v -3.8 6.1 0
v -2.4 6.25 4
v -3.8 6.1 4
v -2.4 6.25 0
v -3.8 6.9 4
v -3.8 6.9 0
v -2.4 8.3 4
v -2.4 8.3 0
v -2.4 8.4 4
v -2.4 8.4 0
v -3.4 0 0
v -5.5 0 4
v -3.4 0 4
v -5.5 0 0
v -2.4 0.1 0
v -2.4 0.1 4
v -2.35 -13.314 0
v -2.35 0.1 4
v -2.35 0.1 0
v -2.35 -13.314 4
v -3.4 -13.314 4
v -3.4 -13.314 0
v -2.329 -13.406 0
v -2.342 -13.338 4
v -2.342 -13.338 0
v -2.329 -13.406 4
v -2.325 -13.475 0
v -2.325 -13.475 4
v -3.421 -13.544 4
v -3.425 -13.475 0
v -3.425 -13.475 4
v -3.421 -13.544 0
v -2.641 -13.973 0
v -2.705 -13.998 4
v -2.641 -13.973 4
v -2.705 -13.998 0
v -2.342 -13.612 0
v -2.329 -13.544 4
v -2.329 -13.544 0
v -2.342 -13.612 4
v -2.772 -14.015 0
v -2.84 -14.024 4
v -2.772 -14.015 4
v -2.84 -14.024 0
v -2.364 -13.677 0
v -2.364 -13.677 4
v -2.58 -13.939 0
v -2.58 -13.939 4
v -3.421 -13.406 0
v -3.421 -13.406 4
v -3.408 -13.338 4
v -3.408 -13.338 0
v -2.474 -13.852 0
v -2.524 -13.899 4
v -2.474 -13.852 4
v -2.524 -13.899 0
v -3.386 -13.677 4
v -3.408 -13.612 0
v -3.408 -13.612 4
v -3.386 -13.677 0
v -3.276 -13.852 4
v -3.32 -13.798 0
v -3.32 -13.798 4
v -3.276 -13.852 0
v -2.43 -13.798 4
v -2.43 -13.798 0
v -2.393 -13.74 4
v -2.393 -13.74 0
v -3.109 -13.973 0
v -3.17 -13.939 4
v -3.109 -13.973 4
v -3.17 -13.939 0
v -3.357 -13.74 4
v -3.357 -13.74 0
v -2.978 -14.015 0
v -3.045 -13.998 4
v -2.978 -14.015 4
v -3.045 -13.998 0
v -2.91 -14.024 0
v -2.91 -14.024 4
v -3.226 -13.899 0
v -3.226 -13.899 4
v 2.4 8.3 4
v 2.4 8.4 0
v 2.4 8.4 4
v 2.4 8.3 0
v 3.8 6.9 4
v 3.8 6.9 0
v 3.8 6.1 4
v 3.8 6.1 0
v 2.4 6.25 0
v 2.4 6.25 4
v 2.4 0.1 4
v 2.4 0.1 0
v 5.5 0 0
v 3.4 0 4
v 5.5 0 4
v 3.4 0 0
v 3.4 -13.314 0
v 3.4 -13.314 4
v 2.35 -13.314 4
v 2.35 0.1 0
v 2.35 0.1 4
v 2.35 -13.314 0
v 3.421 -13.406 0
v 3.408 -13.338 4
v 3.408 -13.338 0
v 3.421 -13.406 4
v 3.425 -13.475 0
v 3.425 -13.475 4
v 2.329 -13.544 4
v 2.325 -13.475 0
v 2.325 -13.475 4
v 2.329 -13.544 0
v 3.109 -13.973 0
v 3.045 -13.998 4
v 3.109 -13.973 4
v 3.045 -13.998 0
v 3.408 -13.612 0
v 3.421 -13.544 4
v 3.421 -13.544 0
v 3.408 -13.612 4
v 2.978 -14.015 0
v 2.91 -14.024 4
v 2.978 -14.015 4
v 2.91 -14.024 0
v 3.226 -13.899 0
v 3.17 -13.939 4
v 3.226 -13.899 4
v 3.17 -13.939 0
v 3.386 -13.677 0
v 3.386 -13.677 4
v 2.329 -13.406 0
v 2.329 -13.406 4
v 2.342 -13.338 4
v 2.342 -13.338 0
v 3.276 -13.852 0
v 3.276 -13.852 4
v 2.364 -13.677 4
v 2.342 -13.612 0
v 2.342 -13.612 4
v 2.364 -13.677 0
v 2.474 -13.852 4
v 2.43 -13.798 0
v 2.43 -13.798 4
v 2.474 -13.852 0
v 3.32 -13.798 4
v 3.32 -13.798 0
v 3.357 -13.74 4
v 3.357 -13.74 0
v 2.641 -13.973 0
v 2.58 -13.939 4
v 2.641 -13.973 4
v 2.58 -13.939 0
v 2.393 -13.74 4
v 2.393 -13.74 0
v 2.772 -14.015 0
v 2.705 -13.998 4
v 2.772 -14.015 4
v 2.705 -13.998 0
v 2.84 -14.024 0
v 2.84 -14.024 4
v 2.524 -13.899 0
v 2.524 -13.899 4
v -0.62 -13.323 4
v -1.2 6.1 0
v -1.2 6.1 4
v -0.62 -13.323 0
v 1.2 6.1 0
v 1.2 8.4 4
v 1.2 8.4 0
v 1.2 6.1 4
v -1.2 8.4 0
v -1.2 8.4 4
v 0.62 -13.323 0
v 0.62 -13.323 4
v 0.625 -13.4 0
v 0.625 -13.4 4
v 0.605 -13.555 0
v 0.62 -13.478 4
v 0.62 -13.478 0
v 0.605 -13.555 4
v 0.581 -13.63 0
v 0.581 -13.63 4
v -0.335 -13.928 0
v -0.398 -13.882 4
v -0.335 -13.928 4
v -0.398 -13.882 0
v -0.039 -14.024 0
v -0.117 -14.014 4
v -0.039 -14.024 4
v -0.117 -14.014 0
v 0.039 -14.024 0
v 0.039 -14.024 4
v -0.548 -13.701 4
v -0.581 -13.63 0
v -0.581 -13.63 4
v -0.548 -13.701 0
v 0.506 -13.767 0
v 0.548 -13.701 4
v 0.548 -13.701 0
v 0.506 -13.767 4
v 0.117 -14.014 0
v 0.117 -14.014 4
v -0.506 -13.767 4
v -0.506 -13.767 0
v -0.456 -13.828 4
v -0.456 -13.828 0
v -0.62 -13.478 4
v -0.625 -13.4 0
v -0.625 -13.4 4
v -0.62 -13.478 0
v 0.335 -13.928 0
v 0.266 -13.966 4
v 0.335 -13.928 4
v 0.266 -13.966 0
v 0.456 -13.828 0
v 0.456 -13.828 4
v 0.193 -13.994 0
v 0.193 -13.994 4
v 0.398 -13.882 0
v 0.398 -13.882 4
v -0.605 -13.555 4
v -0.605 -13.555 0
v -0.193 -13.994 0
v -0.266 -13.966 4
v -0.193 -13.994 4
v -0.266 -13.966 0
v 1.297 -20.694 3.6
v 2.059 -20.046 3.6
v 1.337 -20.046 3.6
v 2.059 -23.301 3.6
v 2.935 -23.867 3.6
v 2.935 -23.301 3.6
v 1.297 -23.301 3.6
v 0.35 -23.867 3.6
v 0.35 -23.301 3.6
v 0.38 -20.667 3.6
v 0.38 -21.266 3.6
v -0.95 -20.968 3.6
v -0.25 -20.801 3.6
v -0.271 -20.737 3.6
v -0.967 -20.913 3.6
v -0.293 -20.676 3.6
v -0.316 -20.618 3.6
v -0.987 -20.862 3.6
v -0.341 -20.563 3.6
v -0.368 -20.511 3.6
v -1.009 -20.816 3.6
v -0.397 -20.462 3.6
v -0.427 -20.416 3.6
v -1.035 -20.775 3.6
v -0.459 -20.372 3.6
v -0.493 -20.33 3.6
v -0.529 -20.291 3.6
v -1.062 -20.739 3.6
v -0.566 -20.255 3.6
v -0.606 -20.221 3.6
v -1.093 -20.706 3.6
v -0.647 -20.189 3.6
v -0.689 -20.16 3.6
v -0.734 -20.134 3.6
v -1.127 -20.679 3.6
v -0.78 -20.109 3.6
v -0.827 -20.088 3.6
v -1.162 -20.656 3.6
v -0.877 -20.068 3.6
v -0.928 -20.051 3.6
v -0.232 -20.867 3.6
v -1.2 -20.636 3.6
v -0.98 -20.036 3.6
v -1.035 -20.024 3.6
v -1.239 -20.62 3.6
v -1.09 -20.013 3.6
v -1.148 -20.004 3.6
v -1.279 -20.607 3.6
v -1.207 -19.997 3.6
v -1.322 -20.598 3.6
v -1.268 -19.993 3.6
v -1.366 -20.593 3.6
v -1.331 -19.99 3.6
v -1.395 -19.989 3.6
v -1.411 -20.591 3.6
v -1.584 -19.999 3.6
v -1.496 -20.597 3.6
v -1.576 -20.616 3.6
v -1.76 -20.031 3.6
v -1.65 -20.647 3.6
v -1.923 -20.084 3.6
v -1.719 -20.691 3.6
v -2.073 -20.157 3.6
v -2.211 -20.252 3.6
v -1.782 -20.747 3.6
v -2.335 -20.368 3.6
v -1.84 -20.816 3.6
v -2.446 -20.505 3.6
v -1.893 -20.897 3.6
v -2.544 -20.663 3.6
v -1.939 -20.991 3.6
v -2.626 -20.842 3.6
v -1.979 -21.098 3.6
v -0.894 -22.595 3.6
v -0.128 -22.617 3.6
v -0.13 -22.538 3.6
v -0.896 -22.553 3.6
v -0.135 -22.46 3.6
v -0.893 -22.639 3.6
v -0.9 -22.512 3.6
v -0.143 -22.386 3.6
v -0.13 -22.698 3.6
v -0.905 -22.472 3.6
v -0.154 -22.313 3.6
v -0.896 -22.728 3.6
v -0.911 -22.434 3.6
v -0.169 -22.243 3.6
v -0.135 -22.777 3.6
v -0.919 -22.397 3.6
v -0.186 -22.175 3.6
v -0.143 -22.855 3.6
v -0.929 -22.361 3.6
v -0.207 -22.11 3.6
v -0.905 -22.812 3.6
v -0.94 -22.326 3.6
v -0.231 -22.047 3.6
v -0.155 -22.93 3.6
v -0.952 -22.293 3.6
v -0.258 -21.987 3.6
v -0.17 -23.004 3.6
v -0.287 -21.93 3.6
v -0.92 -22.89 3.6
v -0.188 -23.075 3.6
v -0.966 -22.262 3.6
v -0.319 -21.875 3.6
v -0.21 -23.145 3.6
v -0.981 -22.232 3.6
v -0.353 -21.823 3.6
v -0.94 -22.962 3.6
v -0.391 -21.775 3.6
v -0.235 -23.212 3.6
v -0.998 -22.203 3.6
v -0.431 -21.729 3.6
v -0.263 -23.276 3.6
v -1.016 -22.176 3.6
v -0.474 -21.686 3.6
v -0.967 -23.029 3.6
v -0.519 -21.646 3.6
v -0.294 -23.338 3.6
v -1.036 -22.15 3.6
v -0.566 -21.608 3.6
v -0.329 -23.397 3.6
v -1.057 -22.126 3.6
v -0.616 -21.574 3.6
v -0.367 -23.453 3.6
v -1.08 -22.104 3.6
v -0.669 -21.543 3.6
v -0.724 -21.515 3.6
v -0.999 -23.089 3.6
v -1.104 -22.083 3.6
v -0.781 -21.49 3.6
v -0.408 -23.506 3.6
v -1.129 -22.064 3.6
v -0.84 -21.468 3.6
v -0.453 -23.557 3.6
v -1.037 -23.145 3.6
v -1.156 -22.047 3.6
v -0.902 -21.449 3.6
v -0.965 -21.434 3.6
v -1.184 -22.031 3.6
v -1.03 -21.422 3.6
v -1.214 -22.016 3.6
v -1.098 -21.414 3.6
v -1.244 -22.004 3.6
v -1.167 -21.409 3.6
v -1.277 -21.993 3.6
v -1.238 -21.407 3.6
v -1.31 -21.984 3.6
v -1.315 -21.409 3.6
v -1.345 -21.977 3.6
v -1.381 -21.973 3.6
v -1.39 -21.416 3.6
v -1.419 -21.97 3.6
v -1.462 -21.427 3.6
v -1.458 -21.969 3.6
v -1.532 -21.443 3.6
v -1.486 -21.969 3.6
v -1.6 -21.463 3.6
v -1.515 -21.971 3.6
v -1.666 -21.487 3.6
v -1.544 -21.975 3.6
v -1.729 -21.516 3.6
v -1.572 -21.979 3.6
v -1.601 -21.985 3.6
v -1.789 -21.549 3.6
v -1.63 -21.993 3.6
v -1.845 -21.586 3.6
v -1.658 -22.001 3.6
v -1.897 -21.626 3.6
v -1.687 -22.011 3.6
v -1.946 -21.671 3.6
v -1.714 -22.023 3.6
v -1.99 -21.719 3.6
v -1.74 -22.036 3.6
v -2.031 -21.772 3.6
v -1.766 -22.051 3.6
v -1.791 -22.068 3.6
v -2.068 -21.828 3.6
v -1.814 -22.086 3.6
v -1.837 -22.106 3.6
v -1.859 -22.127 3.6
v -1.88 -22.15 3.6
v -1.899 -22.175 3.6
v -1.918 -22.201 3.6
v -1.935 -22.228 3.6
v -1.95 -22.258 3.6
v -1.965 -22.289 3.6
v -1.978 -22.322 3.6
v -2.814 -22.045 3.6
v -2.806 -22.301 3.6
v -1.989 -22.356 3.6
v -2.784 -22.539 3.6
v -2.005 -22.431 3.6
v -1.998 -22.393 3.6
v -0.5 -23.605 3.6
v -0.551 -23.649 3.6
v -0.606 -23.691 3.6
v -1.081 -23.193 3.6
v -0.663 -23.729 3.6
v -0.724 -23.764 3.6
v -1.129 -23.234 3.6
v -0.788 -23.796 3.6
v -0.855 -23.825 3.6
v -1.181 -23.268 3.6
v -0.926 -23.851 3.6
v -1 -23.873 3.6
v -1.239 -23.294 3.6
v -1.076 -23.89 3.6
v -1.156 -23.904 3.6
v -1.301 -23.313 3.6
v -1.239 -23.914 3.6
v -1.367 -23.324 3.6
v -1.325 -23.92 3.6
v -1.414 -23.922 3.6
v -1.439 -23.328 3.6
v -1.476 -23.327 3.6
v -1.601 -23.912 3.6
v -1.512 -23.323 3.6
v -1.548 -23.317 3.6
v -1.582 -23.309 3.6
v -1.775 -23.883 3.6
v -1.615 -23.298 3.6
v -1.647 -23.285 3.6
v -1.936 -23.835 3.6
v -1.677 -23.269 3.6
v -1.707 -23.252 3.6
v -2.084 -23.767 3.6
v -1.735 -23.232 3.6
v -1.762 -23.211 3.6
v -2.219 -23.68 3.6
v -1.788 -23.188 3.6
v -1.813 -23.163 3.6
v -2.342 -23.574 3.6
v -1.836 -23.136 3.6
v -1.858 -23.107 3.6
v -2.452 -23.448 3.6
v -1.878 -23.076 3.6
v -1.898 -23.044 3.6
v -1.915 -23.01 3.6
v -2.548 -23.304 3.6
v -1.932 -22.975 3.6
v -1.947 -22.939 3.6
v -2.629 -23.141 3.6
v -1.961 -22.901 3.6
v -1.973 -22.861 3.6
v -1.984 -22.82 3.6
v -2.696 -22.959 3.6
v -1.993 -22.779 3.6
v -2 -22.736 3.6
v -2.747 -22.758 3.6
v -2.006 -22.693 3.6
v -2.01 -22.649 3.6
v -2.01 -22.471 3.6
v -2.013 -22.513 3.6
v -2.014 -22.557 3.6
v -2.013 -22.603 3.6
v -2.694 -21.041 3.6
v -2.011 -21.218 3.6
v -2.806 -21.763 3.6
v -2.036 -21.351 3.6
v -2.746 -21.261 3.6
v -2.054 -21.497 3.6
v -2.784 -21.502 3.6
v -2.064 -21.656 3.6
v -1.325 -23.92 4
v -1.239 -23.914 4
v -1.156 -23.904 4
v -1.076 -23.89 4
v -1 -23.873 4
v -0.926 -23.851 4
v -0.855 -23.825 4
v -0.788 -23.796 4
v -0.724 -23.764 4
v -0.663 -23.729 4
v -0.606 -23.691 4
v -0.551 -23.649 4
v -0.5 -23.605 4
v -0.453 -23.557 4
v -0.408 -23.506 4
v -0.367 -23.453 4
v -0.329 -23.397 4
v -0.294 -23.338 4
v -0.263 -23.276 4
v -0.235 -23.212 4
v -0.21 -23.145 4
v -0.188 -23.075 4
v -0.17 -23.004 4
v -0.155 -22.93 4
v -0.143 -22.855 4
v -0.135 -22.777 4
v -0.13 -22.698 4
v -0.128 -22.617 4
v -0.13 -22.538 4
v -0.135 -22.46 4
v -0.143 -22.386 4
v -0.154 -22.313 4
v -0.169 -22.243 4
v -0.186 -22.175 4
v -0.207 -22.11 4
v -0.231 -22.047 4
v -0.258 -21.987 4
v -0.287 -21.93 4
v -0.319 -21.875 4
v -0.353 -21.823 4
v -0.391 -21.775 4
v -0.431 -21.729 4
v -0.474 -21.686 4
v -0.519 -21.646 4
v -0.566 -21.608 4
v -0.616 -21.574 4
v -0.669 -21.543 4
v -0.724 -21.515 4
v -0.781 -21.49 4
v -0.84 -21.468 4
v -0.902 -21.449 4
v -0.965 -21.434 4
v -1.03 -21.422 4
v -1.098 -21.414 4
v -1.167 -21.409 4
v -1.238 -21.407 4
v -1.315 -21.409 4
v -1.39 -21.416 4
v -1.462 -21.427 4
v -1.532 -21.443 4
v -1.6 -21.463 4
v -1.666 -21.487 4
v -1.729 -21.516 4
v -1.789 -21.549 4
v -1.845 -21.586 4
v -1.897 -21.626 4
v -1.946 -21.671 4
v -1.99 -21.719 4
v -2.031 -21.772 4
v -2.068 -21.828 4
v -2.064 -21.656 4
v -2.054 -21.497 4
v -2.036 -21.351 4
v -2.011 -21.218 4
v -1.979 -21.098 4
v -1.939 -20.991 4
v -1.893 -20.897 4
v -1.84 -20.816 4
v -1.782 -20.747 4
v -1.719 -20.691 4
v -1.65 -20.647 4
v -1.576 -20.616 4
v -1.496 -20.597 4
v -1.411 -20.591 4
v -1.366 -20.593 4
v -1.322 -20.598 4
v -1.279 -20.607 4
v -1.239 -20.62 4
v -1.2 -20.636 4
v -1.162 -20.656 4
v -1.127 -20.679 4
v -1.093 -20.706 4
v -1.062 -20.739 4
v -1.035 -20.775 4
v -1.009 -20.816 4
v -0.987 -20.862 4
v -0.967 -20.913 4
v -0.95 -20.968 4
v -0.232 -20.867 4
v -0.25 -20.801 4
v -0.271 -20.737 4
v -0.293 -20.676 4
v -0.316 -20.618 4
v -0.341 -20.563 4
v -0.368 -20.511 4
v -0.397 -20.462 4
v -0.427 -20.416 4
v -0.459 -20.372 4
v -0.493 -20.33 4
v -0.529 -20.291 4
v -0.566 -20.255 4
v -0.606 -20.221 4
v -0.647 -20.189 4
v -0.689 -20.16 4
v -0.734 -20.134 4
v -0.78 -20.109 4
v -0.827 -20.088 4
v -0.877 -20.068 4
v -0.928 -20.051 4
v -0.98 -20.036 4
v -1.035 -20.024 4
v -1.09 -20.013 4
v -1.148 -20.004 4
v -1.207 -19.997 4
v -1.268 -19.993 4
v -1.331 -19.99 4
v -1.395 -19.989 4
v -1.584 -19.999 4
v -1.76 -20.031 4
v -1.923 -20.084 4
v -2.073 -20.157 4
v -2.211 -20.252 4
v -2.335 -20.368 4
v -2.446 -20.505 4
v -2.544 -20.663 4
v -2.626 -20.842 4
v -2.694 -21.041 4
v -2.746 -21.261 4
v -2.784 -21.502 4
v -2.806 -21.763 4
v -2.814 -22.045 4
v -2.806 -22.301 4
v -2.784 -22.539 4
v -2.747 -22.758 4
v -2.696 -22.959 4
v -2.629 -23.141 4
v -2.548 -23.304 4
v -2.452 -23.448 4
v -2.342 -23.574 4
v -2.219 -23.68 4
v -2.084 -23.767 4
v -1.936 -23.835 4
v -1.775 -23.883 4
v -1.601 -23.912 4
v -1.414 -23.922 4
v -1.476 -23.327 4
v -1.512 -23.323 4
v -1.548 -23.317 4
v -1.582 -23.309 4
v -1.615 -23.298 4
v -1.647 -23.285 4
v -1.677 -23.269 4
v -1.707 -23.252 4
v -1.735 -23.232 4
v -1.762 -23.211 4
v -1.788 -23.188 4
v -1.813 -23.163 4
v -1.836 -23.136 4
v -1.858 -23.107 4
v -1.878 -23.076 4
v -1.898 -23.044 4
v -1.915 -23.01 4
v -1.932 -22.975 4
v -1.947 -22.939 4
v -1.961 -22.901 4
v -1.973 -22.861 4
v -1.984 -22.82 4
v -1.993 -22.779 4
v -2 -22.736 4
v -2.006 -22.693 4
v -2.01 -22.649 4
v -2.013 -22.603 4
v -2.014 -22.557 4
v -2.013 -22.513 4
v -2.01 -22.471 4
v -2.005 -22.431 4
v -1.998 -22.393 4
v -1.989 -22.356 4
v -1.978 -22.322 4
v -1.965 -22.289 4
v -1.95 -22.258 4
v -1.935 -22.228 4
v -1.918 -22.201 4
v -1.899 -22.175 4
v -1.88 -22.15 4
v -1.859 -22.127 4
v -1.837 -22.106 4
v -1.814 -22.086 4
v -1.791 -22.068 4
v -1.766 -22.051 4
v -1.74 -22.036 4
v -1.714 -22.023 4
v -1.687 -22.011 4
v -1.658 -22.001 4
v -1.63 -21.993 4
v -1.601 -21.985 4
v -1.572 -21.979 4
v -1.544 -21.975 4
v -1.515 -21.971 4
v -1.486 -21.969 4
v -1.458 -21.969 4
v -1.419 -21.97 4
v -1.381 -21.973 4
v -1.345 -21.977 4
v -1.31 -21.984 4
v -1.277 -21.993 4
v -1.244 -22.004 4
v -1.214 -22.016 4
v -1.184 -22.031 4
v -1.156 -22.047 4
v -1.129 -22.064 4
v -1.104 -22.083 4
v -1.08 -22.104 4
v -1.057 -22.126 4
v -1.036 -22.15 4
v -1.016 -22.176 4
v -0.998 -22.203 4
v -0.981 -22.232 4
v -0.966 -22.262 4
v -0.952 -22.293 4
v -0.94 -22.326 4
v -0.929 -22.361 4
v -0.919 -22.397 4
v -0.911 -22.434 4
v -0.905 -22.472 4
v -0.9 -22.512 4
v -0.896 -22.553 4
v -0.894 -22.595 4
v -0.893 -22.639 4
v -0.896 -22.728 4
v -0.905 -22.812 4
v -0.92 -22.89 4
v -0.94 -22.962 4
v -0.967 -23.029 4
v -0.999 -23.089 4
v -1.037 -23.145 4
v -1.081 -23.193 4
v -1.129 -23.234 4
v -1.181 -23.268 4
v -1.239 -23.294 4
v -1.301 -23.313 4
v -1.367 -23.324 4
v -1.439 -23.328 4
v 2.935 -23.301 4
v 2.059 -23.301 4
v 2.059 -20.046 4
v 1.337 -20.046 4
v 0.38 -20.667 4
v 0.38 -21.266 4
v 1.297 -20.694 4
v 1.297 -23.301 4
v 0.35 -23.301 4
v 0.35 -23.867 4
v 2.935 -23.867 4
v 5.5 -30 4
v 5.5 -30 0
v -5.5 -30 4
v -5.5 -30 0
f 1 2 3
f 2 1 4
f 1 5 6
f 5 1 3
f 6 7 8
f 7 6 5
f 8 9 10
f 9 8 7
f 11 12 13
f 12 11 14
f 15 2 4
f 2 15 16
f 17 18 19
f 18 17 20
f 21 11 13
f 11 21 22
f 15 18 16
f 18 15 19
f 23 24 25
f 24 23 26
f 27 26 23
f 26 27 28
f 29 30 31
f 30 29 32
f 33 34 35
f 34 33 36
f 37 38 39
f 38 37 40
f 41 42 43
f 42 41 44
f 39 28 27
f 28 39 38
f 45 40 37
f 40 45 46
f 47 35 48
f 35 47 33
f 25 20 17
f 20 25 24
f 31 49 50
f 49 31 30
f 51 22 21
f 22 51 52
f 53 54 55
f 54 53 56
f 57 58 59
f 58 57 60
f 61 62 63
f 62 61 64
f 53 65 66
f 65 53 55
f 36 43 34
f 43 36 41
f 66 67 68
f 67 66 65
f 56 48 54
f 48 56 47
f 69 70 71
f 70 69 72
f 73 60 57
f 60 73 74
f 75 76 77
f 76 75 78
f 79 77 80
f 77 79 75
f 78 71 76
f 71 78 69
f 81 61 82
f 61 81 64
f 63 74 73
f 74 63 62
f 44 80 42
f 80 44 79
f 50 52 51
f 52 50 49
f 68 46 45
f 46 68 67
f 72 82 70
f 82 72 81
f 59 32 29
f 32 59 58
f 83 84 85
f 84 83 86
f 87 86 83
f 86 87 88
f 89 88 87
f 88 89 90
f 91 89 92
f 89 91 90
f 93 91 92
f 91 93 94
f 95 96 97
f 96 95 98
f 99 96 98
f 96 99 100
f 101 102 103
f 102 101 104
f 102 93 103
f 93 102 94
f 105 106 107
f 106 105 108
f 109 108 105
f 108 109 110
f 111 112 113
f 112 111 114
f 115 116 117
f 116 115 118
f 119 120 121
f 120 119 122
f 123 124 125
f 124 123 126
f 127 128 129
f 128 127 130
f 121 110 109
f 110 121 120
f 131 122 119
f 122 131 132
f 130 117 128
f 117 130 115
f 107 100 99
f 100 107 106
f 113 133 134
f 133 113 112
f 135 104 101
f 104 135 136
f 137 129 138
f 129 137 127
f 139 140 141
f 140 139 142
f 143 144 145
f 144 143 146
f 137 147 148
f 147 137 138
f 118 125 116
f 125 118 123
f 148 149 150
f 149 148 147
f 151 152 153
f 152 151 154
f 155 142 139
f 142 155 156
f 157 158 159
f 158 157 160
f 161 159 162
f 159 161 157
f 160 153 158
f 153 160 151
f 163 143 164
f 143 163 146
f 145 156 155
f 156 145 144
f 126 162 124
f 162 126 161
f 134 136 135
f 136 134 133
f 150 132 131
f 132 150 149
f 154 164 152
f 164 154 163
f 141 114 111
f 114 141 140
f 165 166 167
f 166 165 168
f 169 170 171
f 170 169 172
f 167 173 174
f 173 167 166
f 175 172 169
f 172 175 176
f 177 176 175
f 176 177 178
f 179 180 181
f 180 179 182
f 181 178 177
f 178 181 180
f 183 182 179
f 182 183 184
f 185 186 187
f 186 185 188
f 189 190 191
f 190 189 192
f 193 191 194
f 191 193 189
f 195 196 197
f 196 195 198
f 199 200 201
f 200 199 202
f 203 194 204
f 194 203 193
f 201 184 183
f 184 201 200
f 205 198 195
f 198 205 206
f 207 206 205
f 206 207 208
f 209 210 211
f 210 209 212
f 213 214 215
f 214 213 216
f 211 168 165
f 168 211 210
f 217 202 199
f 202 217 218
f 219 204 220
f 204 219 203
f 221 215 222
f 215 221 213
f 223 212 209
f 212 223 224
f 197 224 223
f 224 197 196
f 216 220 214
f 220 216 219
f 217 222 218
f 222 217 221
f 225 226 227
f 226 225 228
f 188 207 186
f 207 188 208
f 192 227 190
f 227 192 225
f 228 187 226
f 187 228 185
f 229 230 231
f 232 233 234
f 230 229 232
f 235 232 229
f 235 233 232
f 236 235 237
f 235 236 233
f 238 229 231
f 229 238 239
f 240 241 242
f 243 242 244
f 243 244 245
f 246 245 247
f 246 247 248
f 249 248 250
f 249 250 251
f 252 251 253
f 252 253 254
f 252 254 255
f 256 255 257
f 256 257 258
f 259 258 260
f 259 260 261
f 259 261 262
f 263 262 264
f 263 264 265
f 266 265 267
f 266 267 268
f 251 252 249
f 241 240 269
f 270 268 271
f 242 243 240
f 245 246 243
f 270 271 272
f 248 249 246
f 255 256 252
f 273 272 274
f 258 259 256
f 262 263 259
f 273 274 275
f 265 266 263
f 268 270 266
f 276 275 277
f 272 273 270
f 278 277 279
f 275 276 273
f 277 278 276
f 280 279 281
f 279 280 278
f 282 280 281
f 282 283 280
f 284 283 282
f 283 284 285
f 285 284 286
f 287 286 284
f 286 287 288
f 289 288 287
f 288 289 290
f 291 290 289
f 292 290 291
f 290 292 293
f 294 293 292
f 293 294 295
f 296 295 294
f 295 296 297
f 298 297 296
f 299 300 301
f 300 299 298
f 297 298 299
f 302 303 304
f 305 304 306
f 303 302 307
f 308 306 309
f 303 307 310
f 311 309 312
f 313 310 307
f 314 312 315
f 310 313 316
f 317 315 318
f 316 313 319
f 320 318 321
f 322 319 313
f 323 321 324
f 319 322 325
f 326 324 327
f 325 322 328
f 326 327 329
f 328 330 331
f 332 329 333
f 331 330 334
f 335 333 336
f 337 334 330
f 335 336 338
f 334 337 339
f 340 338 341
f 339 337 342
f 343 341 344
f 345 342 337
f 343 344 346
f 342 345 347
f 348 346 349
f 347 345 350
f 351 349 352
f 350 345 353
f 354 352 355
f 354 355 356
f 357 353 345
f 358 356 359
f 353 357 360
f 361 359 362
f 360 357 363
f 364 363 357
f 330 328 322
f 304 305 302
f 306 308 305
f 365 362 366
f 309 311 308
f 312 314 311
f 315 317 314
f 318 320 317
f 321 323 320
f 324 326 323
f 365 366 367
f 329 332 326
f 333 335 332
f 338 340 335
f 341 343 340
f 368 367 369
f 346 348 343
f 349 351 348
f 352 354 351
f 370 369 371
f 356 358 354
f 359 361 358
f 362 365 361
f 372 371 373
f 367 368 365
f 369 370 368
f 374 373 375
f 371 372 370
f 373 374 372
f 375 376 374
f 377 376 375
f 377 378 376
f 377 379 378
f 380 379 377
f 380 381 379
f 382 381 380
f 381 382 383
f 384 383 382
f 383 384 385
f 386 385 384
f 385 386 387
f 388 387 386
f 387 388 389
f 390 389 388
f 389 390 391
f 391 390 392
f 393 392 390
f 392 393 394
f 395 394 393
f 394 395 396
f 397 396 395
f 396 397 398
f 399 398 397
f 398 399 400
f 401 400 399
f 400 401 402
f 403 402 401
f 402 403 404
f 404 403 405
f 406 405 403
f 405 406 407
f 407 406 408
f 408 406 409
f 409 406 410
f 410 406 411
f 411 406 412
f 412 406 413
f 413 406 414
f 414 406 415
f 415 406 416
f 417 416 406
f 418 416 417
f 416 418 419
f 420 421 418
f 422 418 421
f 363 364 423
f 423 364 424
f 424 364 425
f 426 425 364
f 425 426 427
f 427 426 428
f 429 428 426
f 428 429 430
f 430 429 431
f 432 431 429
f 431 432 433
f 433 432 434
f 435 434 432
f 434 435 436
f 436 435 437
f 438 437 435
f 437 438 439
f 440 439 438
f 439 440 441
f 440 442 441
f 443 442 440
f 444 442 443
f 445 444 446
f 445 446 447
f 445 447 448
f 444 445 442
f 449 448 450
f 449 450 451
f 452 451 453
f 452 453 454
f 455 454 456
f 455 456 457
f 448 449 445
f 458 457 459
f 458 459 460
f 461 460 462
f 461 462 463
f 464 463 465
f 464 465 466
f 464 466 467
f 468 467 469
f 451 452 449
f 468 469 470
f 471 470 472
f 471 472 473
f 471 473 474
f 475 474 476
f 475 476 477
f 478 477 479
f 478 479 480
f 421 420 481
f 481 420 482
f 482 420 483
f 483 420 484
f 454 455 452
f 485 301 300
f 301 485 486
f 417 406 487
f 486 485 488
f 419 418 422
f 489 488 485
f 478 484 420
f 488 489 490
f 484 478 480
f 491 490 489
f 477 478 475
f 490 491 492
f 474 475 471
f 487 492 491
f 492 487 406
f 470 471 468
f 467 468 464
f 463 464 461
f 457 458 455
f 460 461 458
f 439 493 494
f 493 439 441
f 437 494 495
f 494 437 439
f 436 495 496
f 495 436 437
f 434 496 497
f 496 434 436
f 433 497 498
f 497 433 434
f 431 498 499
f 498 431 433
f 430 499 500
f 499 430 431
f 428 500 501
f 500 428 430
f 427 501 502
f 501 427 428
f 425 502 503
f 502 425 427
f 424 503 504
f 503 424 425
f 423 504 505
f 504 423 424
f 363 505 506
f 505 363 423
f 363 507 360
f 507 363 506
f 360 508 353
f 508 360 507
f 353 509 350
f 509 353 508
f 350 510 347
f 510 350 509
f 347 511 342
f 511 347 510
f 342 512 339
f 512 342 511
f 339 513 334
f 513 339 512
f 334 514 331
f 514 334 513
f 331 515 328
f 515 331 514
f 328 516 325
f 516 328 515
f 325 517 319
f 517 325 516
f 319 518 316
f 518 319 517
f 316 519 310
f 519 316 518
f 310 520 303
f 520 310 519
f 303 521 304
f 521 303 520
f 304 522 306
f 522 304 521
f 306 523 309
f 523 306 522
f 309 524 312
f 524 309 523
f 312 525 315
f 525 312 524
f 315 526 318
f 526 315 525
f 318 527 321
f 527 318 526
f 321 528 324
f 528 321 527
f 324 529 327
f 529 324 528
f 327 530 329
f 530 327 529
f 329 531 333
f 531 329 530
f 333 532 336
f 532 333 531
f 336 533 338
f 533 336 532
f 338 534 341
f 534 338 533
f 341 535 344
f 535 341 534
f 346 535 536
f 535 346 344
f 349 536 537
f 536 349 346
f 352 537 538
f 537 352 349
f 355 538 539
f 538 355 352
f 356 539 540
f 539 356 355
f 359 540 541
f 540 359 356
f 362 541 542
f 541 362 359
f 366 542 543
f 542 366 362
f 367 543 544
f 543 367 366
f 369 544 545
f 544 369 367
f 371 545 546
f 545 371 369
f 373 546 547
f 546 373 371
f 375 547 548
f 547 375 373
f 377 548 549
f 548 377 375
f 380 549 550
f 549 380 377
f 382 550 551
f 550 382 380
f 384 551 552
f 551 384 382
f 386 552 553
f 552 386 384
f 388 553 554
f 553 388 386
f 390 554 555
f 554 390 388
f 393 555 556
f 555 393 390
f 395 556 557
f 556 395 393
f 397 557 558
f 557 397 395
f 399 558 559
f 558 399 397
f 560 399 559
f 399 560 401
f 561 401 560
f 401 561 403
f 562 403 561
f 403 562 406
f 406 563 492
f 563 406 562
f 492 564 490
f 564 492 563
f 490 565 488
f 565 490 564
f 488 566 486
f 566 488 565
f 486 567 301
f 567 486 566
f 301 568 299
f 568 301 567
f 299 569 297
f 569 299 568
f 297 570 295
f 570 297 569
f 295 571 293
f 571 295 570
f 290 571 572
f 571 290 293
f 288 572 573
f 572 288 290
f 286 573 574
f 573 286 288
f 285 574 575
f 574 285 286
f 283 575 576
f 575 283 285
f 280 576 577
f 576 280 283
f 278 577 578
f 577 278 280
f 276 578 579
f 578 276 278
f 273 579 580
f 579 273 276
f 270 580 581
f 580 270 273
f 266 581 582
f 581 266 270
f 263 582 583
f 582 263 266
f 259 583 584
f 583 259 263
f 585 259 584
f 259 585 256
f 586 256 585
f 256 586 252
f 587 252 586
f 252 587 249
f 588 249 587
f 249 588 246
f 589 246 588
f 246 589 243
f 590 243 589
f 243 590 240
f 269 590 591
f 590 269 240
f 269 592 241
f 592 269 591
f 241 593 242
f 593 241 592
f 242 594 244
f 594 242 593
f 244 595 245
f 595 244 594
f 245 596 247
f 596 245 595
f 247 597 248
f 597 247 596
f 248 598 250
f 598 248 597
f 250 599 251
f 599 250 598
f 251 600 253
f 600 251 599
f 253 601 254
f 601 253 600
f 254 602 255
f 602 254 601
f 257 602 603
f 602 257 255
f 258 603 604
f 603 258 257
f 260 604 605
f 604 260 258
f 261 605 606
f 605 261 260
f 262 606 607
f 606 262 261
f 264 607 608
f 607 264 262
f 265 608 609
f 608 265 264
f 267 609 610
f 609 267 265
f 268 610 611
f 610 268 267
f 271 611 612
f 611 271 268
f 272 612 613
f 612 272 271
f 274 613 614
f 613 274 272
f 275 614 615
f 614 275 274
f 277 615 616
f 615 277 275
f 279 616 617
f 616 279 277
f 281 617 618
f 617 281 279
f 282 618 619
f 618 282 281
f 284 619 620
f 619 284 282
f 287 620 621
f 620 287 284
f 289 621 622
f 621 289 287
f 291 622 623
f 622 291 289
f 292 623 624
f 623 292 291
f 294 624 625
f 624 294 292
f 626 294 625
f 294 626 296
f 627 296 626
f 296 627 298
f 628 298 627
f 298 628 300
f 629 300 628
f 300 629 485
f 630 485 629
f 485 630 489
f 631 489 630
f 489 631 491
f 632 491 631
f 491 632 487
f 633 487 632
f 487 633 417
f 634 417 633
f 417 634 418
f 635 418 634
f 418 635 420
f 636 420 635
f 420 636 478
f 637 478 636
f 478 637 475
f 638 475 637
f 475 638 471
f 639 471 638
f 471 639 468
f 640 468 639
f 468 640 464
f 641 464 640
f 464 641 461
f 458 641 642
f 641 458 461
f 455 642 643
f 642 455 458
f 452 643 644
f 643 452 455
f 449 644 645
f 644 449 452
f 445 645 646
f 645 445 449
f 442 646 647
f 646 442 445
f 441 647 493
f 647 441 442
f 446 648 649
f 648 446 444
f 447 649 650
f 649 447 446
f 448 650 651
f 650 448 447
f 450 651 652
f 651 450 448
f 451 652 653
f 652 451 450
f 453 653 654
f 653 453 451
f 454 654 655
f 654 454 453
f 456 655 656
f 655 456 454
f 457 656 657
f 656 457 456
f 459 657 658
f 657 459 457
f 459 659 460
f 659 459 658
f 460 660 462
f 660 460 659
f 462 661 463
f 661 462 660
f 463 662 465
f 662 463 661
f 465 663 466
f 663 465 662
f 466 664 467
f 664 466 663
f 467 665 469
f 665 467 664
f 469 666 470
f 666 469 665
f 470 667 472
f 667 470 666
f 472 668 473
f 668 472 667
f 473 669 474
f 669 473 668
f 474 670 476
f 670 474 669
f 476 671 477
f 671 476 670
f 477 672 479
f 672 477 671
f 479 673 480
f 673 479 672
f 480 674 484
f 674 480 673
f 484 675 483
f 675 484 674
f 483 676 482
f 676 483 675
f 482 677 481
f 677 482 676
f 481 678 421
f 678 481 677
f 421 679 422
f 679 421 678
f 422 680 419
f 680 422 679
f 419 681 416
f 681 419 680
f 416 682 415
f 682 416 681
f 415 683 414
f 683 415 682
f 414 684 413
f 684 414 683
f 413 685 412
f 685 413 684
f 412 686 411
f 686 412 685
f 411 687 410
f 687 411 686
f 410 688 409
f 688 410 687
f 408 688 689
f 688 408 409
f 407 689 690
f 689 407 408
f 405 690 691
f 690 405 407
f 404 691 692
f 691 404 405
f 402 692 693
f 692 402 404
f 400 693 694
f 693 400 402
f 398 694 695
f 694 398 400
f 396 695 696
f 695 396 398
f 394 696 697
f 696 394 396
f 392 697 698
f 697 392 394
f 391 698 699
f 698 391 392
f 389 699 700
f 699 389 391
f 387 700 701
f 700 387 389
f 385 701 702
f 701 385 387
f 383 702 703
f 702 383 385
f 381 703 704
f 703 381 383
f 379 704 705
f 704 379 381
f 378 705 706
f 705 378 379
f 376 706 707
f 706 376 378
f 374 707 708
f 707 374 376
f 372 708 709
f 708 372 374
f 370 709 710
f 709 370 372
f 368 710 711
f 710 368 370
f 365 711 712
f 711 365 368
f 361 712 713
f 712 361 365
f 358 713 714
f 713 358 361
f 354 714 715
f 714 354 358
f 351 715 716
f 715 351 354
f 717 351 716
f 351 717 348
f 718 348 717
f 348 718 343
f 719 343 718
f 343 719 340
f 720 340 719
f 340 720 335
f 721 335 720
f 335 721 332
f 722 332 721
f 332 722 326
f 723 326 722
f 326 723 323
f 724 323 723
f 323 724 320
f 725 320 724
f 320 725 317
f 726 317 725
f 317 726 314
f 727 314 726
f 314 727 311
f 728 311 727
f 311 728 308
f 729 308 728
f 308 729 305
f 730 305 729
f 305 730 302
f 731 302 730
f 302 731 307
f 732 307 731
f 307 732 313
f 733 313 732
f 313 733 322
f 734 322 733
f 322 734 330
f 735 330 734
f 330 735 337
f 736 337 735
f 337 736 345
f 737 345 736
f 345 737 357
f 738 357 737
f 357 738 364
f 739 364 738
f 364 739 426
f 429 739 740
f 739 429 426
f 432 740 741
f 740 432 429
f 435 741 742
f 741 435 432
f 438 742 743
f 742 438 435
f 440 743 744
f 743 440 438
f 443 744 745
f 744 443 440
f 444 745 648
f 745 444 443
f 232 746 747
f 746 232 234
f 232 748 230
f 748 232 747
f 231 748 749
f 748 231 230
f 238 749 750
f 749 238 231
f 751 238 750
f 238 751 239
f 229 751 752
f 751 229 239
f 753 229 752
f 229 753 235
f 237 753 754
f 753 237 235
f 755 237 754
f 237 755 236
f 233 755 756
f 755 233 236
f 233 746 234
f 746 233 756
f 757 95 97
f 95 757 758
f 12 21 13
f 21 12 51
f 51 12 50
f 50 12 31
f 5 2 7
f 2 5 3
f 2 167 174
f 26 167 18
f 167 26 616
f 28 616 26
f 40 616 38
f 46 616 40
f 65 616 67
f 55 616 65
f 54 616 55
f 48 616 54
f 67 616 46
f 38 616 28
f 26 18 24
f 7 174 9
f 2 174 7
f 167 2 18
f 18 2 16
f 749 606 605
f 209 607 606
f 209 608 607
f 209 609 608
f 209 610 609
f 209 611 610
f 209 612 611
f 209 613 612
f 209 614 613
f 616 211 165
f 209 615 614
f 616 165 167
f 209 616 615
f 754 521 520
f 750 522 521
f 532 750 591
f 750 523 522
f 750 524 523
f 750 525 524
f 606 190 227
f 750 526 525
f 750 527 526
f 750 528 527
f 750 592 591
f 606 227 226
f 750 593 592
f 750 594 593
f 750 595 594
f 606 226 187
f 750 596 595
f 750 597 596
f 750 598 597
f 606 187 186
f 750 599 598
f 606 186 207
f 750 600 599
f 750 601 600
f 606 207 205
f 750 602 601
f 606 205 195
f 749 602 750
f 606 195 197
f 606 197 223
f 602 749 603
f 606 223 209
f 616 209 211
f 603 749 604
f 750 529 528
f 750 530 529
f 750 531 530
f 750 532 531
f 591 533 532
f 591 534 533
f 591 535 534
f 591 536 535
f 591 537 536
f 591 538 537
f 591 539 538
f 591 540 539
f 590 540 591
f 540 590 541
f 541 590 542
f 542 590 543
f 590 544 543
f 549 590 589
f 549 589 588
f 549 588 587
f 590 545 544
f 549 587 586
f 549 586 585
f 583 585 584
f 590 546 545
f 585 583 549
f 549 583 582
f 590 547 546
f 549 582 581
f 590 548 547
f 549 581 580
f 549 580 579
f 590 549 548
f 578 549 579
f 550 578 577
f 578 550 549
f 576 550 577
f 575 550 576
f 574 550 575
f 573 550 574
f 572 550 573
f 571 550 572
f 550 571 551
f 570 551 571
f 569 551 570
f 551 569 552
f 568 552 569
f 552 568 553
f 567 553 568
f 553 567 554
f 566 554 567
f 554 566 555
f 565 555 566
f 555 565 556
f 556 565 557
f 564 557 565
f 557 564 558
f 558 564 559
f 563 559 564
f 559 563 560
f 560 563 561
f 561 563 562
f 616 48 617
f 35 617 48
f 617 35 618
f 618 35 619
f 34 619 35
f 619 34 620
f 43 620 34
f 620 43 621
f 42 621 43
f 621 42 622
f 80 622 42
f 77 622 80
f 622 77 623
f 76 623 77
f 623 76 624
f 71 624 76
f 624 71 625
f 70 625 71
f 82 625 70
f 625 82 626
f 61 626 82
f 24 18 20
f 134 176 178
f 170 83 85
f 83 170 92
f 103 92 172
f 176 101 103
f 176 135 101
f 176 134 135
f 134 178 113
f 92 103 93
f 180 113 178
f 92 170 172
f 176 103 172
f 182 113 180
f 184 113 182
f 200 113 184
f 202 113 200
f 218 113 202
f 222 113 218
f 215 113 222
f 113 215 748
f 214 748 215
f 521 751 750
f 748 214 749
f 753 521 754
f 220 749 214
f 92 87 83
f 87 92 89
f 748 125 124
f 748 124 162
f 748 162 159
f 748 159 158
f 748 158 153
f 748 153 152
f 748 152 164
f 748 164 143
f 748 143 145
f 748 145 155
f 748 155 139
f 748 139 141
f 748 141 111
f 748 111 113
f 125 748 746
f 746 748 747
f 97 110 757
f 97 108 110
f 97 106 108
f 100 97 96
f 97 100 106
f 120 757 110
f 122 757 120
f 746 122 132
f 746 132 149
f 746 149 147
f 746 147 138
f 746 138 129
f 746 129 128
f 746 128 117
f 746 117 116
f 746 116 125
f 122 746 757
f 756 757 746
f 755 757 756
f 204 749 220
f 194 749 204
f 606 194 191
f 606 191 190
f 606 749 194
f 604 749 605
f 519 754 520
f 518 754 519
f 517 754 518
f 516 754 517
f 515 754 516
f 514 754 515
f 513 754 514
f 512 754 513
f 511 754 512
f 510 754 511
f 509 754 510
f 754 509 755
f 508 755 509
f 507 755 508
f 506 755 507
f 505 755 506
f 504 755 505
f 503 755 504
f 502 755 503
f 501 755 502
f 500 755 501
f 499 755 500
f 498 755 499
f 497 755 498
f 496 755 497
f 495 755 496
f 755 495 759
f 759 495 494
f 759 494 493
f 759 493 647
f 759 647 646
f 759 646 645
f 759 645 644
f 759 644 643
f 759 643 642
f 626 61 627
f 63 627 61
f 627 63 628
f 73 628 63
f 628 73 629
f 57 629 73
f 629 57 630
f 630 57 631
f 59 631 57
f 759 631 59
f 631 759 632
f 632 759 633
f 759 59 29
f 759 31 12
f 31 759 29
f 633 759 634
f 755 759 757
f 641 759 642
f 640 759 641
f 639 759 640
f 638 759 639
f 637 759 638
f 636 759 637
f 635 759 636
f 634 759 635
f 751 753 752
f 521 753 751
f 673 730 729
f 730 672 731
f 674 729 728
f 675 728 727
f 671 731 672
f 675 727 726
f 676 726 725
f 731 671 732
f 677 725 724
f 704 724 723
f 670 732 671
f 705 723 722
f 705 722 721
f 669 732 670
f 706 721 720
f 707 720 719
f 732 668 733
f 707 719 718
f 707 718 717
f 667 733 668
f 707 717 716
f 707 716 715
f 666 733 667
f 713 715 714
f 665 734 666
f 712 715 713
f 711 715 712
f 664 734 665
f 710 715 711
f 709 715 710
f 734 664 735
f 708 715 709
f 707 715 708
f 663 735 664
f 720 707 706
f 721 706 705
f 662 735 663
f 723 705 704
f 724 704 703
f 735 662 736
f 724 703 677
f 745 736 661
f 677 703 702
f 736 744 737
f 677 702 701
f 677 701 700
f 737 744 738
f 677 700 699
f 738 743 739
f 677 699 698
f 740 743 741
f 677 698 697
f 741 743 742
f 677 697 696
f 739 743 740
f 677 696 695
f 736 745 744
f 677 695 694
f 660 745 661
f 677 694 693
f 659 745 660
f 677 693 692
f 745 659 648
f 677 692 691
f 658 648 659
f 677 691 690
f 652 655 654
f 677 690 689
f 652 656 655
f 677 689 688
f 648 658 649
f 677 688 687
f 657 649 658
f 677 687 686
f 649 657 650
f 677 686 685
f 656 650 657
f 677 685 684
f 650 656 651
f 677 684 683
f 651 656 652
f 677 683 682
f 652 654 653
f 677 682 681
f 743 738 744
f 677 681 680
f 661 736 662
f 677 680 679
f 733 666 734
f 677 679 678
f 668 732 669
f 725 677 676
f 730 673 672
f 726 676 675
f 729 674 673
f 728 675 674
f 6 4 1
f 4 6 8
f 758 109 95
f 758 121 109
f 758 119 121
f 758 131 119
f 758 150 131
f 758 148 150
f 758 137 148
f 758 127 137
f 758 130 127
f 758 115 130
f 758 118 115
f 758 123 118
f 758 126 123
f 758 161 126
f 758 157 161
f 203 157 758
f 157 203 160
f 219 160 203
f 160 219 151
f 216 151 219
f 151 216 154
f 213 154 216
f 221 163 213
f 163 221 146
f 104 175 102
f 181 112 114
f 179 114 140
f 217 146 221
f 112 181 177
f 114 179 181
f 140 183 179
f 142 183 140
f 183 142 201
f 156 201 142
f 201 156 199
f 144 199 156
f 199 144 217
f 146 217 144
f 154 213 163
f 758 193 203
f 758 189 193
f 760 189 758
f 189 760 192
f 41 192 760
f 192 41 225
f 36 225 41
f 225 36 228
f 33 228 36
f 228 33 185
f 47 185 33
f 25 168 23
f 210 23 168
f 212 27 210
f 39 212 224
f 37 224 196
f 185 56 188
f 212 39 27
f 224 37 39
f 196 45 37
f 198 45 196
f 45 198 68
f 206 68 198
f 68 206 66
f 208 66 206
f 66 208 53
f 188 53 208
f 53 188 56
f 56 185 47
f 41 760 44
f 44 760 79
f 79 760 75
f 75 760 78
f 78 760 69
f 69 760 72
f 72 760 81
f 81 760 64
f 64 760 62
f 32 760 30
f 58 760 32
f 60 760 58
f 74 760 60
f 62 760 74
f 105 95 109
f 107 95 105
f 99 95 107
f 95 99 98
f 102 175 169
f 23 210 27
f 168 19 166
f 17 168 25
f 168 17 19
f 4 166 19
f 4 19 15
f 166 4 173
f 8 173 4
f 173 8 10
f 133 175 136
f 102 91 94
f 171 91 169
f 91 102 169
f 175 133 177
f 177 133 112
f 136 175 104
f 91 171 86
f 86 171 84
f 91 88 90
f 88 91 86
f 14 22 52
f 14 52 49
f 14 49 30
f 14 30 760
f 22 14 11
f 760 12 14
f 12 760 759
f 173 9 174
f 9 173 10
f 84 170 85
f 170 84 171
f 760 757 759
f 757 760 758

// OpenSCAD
$fn = 50;

difference() {
	union() {
		translate(v = [0, 0, 0]) {
			rotate(a = [0, 0, 0]) {
				difference() {
					union() {
						translate(v = [-5.5, -30.0, 0]) {
							cube(size = [11.0, 38.4, 4.0]);
						}
					}
					union() {
						translate(v = [0, 0, -0.1]) {
							linear_extrude(height = 4.2) {
								polygon(points = [[-2.4, 0], [-2.4, 6.25], [-3.8, 6.1], [-3.8, 6.8999999999999995], [-2.4, 8.299999999999999], [-2.4, 9.399999999999999], [-5.7, 9.399999999999999], [-5.7, 0]]);
							}
						}
						translate(v = [0, 0, -0.1]) {
							linear_extrude(height = 4.2) {
								polygon(points = [[-2.35, -13.5], [-2.35, -13.1625], [-2.35, -12.825], [-2.35, -12.4875], [-2.35, -12.15], [-2.35, -11.8125], [-2.35, -11.475], [-2.35, -11.1375], [-2.35, -10.8], [-2.35, -10.4625], [-2.35, -10.125], [-2.35, -9.7875], [-2.35, -9.45], [-2.35, -9.1125], [-2.35, -8.775], [-2.35, -8.4375], [-2.35, -8.1], [-2.35, -7.7625], [-2.35, -7.425], [-2.35, -7.0875], [-2.35, -6.75], [-2.35, -6.4125], [-2.35, -6.075], [-2.35, -5.7375], [-2.35, -5.4], [-2.35, -5.0625], [-2.35, -4.725], [-2.35, -4.387499999999999], [-2.35, -4.050000000000001], [-2.35, -3.7125000000000004], [-2.35, -3.375], [-2.35, -3.0374999999999996], [-2.35, -2.6999999999999993], [-2.35, -2.3625000000000007], [-2.35, -2.0250000000000004], [-2.35, -1.6875], [-2.35, -1.3499999999999996], [-2.35, -1.0124999999999993], [-2.35, -0.6750000000000007], [-2.35, -0.33750000000000036], [-2.35, 0.0], [-2.35, 0.1], [-3.4, 0.1], [-3.4, -13.5]]);
							}
						}
						translate(v = [-2.875, -13.475, -0.1]) {
							cylinder(h = 4.2, r = 0.55);
						}
						translate(v = [0, 0, -0.1]) {
							linear_extrude(height = 4.2) {
								polygon(points = [[2.4, 0], [2.4, 6.25], [3.8, 6.1], [3.8, 6.8999999999999995], [2.4, 8.299999999999999], [2.4, 9.399999999999999], [5.7, 9.399999999999999], [5.7, 0]]);
							}
						}
						translate(v = [0, 0, -0.1]) {
							linear_extrude(height = 4.2) {
								polygon(points = [[2.35, -13.5], [2.35, -13.1625], [2.35, -12.825], [2.35, -12.4875], [2.35, -12.15], [2.35, -11.8125], [2.35, -11.475], [2.35, -11.1375], [2.35, -10.8], [2.35, -10.4625], [2.35, -10.125], [2.35, -9.7875], [2.35, -9.45], [2.35, -9.1125], [2.35, -8.775], [2.35, -8.4375], [2.35, -8.1], [2.35, -7.7625], [2.35, -7.425], [2.35, -7.0875], [2.35, -6.75], [2.35, -6.4125], [2.35, -6.075], [2.35, -5.7375], [2.35, -5.4], [2.35, -5.0625], [2.35, -4.725], [2.35, -4.387499999999999], [2.35, -4.050000000000001], [2.35, -3.7125000000000004], [2.35, -3.375], [2.35, -3.0374999999999996], [2.35, -2.6999999999999993], [2.35, -2.3625000000000007], [2.35, -2.0250000000000004], [2.35, -1.6875], [2.35, -1.3499999999999996], [2.35, -1.0124999999999993], [2.35, -0.6750000000000007], [2.35, -0.33750000000000036], [2.35, 0.0], [2.35, 0.1], [3.4, 0.1], [3.4, -13.5]]);
							}
						}
						translate(v = [2.875, -13.475, -0.1]) {
							cylinder(h = 4.2, r = 0.55);
						}
						translate(v = [0, 0, -0.1]) {
							linear_extrude(height = 4.2) {
								polygon(points = [[-0.616417910447761, -13.450000000000001], [-0.6261620469083153, -13.123571428571429], [-0.6359061833688697, -12.797142857142859], [-0.6456503198294241, -12.470714285714287], [-0.6553944562899785, -12.144285714285715], [-0.6651385927505329, -11.817857142857145], [-0.6748827292110873, -11.491428571428573], [-0.6846268656716417, -11.165000000000001], [-0.694371002132196, -10.83857142857143], [-0.7041151385927504, -10.512142857142859], [-0.7138592750533048, -10.185714285714287], [-0.7236034115138592, -9.859285714285715], [-0.7333475479744134, -9.532857142857145], [-0.743091684434968, -9.206428571428573], [-0.7528358208955221, -8.880000000000003], [-0.7625799573560765, -8.55357142857143], [-0.7723240938166309, -8.227142857142859], [-0.7820682302771853, -7.900714285714287], [-0.7918123667377397, -7.574285714285716], [-0.8015565031982941, -7.2478571428571446], [-0.8113006396588485, -6.9214285714285735], [-0.8210447761194029, -6.5950000000000015], [-0.8307889125799572, -6.2685714285714305], [-0.8405330490405116, -5.9421428571428585], [-0.850277185501066, -5.615714285714287], [-0.8600213219616204, -5.289285714285715], [-0.8697654584221746, -4.962857142857144], [-0.879509594882729, -4.636428571428574], [-0.8892537313432833, -4.310000000000002], [-0.8989978678038377, -3.9835714285714303], [-0.9087420042643921, -3.65714285714286], [-0.9184861407249465, -3.330714285714288], [-0.9282302771855009, -3.0042857142857162], [-0.9379744136460553, -2.6778571428571443], [-0.9477185501066097, -2.3514285714285723], [-0.957462686567164, -2.025000000000002], [-0.9672068230277184, -1.6985714285714302], [-0.9769509594882728, -1.37214285714286], [-0.9866950959488272, -1.045714285714288], [-0.9964392324093814, -0.7192857142857179], [-1.0061833688699358, -0.3928571428571459], [-1.0159275053304904, -0.06642857142857395], [-1.017910447761194, 0], [-1.0256716417910445, 0.259999999999998], [-1.0354157782515991, 0.58642857142857], [-1.0451599147121533, 0.9128571428571401], [-1.0549040511727077, 1.2392857142857139], [-1.064648187633262, 1.565714285714284], [-1.0743923240938165, 1.8921428571428542], [-1.0841364605543709, 2.218571428571426], [-1.093880597014925, 2.5449999999999964], [-1.1036247334754798, 2.871428571428572], [-1.1133688699360338, 3.1978571428571403], [-1.1231130063965882, 3.5242857142857122], [-1.1328571428571426, 3.850714285714284], [-1.142601279317697, 4.177142857142853], [-1.1523454157782513, 4.503571428571425], [-1.1620895522388057, 4.8299999999999965], [-1.17183368869936, 5.1564285714285685], [-1.1815778251599145, 5.48285714285714], [-1.1913219616204689, 5.809285714285712], [-1.2, 6.1], [-1.2, 6.135714285714281], [-1.2, 6.25], [-1.2, 6.462142857142856], [-1.2, 6.788571428571425], [-1.2, 7.114999999999997], [-1.2, 7.441428571428569], [-1.2, 7.767857142857137], [-1.2, 8.094285714285713], [-1.2, 8.420714285714281], [-1.2, 8.747142857142856], [-1.2, 9.073571428571425], [-1.2, 9.399999999999997], [1.2, 9.399999999999997], [1.2, 9.073571428571425], [1.2, 8.747142857142856], [1.2, 8.420714285714281], [1.2, 8.094285714285713], [1.2, 7.767857142857137], [1.2, 7.441428571428569], [1.2, 7.114999999999997], [1.2, 6.788571428571425], [1.2, 6.462142857142856], [1.2, 6.25], [1.2, 6.135714285714281], [1.2, 6.1], [1.1913219616204689, 5.809285714285712], [1.1815778251599145, 5.48285714285714], [1.17183368869936, 5.1564285714285685], [1.1620895522388057, 4.8299999999999965], [1.1523454157782513, 4.503571428571425], [1.142601279317697, 4.177142857142853], [1.1328571428571426, 3.850714285714284], [1.1231130063965882, 3.5242857142857122], [1.1133688699360338, 3.1978571428571403], [1.1036247334754798, 2.871428571428572], [1.093880597014925, 2.5449999999999964], [1.0841364605543709, 2.218571428571426], [1.0743923240938165, 1.8921428571428542], [1.064648187633262, 1.565714285714284], [1.0549040511727077, 1.2392857142857139], [1.0451599147121533, 0.9128571428571401], [1.0354157782515991, 0.58642857142857], [1.0256716417910445, 0.259999999999998], [1.017910447761194, 0], [1.0159275053304904, -0.06642857142857395], [1.0061833688699358, -0.3928571428571459], [0.9964392324093814, -0.7192857142857179], [0.9866950959488272, -1.045714285714288], [0.9769509594882728, -1.37214285714286], [0.9672068230277184, -1.6985714285714302], [0.957462686567164, -2.025000000000002], [0.9477185501066097, -2.3514285714285723], [0.9379744136460553, -2.6778571428571443], [0.9282302771855009, -3.0042857142857162], [0.9184861407249465, -3.330714285714288], [0.9087420042643921, -3.65714285714286], [0.8989978678038377, -3.9835714285714303], [0.8892537313432833, -4.310000000000002], [0.879509594882729, -4.636428571428574], [0.8697654584221746, -4.962857142857144], [0.8600213219616204, -5.289285714285715], [0.850277185501066, -5.615714285714287], [0.8405330490405116, -5.9421428571428585], [0.8307889125799572, -6.2685714285714305], [0.8210447761194029, -6.5950000000000015], [0.8113006396588485, -6.9214285714285735], [0.8015565031982941, -7.2478571428571446], [0.7918123667377397, -7.574285714285716], [0.7820682302771853, -7.900714285714287], [0.7723240938166309, -8.227142857142859], [0.7625799573560765, -8.55357142857143], [0.7528358208955221, -8.880000000000003], [0.743091684434968, -9.206428571428573], [0.7333475479744134, -9.532857142857145], [0.7236034115138592, -9.859285714285715], [0.7138592750533048, -10.185714285714287], [0.7041151385927504, -10.512142857142859], [0.694371002132196, -10.83857142857143], [0.6846268656716417, -11.165000000000001], [0.6748827292110873, -11.491428571428573], [0.6651385927505329, -11.817857142857145], [0.6553944562899785, -12.144285714285715], [0.6456503198294241, -12.470714285714287], [0.6359061833688697, -12.797142857142859], [0.6261620469083153, -13.123571428571429], [0.616417910447761, -13.450000000000001]]);
							}
						}
						translate(v = [0, -13.4, -0.1]) {
							cylinder(h = 4.2, r = 0.6249999999999999);
						}
						translate(v = [0, -22, 3.6]) {
							linear_extrude(height = 0.5) {
								text(font = "Arial:style=Bold", halign = "center", size = 4.0, text = "61", valign = "center");
							}
						}
					}
				}
			}
		}
	}
	union();
}
